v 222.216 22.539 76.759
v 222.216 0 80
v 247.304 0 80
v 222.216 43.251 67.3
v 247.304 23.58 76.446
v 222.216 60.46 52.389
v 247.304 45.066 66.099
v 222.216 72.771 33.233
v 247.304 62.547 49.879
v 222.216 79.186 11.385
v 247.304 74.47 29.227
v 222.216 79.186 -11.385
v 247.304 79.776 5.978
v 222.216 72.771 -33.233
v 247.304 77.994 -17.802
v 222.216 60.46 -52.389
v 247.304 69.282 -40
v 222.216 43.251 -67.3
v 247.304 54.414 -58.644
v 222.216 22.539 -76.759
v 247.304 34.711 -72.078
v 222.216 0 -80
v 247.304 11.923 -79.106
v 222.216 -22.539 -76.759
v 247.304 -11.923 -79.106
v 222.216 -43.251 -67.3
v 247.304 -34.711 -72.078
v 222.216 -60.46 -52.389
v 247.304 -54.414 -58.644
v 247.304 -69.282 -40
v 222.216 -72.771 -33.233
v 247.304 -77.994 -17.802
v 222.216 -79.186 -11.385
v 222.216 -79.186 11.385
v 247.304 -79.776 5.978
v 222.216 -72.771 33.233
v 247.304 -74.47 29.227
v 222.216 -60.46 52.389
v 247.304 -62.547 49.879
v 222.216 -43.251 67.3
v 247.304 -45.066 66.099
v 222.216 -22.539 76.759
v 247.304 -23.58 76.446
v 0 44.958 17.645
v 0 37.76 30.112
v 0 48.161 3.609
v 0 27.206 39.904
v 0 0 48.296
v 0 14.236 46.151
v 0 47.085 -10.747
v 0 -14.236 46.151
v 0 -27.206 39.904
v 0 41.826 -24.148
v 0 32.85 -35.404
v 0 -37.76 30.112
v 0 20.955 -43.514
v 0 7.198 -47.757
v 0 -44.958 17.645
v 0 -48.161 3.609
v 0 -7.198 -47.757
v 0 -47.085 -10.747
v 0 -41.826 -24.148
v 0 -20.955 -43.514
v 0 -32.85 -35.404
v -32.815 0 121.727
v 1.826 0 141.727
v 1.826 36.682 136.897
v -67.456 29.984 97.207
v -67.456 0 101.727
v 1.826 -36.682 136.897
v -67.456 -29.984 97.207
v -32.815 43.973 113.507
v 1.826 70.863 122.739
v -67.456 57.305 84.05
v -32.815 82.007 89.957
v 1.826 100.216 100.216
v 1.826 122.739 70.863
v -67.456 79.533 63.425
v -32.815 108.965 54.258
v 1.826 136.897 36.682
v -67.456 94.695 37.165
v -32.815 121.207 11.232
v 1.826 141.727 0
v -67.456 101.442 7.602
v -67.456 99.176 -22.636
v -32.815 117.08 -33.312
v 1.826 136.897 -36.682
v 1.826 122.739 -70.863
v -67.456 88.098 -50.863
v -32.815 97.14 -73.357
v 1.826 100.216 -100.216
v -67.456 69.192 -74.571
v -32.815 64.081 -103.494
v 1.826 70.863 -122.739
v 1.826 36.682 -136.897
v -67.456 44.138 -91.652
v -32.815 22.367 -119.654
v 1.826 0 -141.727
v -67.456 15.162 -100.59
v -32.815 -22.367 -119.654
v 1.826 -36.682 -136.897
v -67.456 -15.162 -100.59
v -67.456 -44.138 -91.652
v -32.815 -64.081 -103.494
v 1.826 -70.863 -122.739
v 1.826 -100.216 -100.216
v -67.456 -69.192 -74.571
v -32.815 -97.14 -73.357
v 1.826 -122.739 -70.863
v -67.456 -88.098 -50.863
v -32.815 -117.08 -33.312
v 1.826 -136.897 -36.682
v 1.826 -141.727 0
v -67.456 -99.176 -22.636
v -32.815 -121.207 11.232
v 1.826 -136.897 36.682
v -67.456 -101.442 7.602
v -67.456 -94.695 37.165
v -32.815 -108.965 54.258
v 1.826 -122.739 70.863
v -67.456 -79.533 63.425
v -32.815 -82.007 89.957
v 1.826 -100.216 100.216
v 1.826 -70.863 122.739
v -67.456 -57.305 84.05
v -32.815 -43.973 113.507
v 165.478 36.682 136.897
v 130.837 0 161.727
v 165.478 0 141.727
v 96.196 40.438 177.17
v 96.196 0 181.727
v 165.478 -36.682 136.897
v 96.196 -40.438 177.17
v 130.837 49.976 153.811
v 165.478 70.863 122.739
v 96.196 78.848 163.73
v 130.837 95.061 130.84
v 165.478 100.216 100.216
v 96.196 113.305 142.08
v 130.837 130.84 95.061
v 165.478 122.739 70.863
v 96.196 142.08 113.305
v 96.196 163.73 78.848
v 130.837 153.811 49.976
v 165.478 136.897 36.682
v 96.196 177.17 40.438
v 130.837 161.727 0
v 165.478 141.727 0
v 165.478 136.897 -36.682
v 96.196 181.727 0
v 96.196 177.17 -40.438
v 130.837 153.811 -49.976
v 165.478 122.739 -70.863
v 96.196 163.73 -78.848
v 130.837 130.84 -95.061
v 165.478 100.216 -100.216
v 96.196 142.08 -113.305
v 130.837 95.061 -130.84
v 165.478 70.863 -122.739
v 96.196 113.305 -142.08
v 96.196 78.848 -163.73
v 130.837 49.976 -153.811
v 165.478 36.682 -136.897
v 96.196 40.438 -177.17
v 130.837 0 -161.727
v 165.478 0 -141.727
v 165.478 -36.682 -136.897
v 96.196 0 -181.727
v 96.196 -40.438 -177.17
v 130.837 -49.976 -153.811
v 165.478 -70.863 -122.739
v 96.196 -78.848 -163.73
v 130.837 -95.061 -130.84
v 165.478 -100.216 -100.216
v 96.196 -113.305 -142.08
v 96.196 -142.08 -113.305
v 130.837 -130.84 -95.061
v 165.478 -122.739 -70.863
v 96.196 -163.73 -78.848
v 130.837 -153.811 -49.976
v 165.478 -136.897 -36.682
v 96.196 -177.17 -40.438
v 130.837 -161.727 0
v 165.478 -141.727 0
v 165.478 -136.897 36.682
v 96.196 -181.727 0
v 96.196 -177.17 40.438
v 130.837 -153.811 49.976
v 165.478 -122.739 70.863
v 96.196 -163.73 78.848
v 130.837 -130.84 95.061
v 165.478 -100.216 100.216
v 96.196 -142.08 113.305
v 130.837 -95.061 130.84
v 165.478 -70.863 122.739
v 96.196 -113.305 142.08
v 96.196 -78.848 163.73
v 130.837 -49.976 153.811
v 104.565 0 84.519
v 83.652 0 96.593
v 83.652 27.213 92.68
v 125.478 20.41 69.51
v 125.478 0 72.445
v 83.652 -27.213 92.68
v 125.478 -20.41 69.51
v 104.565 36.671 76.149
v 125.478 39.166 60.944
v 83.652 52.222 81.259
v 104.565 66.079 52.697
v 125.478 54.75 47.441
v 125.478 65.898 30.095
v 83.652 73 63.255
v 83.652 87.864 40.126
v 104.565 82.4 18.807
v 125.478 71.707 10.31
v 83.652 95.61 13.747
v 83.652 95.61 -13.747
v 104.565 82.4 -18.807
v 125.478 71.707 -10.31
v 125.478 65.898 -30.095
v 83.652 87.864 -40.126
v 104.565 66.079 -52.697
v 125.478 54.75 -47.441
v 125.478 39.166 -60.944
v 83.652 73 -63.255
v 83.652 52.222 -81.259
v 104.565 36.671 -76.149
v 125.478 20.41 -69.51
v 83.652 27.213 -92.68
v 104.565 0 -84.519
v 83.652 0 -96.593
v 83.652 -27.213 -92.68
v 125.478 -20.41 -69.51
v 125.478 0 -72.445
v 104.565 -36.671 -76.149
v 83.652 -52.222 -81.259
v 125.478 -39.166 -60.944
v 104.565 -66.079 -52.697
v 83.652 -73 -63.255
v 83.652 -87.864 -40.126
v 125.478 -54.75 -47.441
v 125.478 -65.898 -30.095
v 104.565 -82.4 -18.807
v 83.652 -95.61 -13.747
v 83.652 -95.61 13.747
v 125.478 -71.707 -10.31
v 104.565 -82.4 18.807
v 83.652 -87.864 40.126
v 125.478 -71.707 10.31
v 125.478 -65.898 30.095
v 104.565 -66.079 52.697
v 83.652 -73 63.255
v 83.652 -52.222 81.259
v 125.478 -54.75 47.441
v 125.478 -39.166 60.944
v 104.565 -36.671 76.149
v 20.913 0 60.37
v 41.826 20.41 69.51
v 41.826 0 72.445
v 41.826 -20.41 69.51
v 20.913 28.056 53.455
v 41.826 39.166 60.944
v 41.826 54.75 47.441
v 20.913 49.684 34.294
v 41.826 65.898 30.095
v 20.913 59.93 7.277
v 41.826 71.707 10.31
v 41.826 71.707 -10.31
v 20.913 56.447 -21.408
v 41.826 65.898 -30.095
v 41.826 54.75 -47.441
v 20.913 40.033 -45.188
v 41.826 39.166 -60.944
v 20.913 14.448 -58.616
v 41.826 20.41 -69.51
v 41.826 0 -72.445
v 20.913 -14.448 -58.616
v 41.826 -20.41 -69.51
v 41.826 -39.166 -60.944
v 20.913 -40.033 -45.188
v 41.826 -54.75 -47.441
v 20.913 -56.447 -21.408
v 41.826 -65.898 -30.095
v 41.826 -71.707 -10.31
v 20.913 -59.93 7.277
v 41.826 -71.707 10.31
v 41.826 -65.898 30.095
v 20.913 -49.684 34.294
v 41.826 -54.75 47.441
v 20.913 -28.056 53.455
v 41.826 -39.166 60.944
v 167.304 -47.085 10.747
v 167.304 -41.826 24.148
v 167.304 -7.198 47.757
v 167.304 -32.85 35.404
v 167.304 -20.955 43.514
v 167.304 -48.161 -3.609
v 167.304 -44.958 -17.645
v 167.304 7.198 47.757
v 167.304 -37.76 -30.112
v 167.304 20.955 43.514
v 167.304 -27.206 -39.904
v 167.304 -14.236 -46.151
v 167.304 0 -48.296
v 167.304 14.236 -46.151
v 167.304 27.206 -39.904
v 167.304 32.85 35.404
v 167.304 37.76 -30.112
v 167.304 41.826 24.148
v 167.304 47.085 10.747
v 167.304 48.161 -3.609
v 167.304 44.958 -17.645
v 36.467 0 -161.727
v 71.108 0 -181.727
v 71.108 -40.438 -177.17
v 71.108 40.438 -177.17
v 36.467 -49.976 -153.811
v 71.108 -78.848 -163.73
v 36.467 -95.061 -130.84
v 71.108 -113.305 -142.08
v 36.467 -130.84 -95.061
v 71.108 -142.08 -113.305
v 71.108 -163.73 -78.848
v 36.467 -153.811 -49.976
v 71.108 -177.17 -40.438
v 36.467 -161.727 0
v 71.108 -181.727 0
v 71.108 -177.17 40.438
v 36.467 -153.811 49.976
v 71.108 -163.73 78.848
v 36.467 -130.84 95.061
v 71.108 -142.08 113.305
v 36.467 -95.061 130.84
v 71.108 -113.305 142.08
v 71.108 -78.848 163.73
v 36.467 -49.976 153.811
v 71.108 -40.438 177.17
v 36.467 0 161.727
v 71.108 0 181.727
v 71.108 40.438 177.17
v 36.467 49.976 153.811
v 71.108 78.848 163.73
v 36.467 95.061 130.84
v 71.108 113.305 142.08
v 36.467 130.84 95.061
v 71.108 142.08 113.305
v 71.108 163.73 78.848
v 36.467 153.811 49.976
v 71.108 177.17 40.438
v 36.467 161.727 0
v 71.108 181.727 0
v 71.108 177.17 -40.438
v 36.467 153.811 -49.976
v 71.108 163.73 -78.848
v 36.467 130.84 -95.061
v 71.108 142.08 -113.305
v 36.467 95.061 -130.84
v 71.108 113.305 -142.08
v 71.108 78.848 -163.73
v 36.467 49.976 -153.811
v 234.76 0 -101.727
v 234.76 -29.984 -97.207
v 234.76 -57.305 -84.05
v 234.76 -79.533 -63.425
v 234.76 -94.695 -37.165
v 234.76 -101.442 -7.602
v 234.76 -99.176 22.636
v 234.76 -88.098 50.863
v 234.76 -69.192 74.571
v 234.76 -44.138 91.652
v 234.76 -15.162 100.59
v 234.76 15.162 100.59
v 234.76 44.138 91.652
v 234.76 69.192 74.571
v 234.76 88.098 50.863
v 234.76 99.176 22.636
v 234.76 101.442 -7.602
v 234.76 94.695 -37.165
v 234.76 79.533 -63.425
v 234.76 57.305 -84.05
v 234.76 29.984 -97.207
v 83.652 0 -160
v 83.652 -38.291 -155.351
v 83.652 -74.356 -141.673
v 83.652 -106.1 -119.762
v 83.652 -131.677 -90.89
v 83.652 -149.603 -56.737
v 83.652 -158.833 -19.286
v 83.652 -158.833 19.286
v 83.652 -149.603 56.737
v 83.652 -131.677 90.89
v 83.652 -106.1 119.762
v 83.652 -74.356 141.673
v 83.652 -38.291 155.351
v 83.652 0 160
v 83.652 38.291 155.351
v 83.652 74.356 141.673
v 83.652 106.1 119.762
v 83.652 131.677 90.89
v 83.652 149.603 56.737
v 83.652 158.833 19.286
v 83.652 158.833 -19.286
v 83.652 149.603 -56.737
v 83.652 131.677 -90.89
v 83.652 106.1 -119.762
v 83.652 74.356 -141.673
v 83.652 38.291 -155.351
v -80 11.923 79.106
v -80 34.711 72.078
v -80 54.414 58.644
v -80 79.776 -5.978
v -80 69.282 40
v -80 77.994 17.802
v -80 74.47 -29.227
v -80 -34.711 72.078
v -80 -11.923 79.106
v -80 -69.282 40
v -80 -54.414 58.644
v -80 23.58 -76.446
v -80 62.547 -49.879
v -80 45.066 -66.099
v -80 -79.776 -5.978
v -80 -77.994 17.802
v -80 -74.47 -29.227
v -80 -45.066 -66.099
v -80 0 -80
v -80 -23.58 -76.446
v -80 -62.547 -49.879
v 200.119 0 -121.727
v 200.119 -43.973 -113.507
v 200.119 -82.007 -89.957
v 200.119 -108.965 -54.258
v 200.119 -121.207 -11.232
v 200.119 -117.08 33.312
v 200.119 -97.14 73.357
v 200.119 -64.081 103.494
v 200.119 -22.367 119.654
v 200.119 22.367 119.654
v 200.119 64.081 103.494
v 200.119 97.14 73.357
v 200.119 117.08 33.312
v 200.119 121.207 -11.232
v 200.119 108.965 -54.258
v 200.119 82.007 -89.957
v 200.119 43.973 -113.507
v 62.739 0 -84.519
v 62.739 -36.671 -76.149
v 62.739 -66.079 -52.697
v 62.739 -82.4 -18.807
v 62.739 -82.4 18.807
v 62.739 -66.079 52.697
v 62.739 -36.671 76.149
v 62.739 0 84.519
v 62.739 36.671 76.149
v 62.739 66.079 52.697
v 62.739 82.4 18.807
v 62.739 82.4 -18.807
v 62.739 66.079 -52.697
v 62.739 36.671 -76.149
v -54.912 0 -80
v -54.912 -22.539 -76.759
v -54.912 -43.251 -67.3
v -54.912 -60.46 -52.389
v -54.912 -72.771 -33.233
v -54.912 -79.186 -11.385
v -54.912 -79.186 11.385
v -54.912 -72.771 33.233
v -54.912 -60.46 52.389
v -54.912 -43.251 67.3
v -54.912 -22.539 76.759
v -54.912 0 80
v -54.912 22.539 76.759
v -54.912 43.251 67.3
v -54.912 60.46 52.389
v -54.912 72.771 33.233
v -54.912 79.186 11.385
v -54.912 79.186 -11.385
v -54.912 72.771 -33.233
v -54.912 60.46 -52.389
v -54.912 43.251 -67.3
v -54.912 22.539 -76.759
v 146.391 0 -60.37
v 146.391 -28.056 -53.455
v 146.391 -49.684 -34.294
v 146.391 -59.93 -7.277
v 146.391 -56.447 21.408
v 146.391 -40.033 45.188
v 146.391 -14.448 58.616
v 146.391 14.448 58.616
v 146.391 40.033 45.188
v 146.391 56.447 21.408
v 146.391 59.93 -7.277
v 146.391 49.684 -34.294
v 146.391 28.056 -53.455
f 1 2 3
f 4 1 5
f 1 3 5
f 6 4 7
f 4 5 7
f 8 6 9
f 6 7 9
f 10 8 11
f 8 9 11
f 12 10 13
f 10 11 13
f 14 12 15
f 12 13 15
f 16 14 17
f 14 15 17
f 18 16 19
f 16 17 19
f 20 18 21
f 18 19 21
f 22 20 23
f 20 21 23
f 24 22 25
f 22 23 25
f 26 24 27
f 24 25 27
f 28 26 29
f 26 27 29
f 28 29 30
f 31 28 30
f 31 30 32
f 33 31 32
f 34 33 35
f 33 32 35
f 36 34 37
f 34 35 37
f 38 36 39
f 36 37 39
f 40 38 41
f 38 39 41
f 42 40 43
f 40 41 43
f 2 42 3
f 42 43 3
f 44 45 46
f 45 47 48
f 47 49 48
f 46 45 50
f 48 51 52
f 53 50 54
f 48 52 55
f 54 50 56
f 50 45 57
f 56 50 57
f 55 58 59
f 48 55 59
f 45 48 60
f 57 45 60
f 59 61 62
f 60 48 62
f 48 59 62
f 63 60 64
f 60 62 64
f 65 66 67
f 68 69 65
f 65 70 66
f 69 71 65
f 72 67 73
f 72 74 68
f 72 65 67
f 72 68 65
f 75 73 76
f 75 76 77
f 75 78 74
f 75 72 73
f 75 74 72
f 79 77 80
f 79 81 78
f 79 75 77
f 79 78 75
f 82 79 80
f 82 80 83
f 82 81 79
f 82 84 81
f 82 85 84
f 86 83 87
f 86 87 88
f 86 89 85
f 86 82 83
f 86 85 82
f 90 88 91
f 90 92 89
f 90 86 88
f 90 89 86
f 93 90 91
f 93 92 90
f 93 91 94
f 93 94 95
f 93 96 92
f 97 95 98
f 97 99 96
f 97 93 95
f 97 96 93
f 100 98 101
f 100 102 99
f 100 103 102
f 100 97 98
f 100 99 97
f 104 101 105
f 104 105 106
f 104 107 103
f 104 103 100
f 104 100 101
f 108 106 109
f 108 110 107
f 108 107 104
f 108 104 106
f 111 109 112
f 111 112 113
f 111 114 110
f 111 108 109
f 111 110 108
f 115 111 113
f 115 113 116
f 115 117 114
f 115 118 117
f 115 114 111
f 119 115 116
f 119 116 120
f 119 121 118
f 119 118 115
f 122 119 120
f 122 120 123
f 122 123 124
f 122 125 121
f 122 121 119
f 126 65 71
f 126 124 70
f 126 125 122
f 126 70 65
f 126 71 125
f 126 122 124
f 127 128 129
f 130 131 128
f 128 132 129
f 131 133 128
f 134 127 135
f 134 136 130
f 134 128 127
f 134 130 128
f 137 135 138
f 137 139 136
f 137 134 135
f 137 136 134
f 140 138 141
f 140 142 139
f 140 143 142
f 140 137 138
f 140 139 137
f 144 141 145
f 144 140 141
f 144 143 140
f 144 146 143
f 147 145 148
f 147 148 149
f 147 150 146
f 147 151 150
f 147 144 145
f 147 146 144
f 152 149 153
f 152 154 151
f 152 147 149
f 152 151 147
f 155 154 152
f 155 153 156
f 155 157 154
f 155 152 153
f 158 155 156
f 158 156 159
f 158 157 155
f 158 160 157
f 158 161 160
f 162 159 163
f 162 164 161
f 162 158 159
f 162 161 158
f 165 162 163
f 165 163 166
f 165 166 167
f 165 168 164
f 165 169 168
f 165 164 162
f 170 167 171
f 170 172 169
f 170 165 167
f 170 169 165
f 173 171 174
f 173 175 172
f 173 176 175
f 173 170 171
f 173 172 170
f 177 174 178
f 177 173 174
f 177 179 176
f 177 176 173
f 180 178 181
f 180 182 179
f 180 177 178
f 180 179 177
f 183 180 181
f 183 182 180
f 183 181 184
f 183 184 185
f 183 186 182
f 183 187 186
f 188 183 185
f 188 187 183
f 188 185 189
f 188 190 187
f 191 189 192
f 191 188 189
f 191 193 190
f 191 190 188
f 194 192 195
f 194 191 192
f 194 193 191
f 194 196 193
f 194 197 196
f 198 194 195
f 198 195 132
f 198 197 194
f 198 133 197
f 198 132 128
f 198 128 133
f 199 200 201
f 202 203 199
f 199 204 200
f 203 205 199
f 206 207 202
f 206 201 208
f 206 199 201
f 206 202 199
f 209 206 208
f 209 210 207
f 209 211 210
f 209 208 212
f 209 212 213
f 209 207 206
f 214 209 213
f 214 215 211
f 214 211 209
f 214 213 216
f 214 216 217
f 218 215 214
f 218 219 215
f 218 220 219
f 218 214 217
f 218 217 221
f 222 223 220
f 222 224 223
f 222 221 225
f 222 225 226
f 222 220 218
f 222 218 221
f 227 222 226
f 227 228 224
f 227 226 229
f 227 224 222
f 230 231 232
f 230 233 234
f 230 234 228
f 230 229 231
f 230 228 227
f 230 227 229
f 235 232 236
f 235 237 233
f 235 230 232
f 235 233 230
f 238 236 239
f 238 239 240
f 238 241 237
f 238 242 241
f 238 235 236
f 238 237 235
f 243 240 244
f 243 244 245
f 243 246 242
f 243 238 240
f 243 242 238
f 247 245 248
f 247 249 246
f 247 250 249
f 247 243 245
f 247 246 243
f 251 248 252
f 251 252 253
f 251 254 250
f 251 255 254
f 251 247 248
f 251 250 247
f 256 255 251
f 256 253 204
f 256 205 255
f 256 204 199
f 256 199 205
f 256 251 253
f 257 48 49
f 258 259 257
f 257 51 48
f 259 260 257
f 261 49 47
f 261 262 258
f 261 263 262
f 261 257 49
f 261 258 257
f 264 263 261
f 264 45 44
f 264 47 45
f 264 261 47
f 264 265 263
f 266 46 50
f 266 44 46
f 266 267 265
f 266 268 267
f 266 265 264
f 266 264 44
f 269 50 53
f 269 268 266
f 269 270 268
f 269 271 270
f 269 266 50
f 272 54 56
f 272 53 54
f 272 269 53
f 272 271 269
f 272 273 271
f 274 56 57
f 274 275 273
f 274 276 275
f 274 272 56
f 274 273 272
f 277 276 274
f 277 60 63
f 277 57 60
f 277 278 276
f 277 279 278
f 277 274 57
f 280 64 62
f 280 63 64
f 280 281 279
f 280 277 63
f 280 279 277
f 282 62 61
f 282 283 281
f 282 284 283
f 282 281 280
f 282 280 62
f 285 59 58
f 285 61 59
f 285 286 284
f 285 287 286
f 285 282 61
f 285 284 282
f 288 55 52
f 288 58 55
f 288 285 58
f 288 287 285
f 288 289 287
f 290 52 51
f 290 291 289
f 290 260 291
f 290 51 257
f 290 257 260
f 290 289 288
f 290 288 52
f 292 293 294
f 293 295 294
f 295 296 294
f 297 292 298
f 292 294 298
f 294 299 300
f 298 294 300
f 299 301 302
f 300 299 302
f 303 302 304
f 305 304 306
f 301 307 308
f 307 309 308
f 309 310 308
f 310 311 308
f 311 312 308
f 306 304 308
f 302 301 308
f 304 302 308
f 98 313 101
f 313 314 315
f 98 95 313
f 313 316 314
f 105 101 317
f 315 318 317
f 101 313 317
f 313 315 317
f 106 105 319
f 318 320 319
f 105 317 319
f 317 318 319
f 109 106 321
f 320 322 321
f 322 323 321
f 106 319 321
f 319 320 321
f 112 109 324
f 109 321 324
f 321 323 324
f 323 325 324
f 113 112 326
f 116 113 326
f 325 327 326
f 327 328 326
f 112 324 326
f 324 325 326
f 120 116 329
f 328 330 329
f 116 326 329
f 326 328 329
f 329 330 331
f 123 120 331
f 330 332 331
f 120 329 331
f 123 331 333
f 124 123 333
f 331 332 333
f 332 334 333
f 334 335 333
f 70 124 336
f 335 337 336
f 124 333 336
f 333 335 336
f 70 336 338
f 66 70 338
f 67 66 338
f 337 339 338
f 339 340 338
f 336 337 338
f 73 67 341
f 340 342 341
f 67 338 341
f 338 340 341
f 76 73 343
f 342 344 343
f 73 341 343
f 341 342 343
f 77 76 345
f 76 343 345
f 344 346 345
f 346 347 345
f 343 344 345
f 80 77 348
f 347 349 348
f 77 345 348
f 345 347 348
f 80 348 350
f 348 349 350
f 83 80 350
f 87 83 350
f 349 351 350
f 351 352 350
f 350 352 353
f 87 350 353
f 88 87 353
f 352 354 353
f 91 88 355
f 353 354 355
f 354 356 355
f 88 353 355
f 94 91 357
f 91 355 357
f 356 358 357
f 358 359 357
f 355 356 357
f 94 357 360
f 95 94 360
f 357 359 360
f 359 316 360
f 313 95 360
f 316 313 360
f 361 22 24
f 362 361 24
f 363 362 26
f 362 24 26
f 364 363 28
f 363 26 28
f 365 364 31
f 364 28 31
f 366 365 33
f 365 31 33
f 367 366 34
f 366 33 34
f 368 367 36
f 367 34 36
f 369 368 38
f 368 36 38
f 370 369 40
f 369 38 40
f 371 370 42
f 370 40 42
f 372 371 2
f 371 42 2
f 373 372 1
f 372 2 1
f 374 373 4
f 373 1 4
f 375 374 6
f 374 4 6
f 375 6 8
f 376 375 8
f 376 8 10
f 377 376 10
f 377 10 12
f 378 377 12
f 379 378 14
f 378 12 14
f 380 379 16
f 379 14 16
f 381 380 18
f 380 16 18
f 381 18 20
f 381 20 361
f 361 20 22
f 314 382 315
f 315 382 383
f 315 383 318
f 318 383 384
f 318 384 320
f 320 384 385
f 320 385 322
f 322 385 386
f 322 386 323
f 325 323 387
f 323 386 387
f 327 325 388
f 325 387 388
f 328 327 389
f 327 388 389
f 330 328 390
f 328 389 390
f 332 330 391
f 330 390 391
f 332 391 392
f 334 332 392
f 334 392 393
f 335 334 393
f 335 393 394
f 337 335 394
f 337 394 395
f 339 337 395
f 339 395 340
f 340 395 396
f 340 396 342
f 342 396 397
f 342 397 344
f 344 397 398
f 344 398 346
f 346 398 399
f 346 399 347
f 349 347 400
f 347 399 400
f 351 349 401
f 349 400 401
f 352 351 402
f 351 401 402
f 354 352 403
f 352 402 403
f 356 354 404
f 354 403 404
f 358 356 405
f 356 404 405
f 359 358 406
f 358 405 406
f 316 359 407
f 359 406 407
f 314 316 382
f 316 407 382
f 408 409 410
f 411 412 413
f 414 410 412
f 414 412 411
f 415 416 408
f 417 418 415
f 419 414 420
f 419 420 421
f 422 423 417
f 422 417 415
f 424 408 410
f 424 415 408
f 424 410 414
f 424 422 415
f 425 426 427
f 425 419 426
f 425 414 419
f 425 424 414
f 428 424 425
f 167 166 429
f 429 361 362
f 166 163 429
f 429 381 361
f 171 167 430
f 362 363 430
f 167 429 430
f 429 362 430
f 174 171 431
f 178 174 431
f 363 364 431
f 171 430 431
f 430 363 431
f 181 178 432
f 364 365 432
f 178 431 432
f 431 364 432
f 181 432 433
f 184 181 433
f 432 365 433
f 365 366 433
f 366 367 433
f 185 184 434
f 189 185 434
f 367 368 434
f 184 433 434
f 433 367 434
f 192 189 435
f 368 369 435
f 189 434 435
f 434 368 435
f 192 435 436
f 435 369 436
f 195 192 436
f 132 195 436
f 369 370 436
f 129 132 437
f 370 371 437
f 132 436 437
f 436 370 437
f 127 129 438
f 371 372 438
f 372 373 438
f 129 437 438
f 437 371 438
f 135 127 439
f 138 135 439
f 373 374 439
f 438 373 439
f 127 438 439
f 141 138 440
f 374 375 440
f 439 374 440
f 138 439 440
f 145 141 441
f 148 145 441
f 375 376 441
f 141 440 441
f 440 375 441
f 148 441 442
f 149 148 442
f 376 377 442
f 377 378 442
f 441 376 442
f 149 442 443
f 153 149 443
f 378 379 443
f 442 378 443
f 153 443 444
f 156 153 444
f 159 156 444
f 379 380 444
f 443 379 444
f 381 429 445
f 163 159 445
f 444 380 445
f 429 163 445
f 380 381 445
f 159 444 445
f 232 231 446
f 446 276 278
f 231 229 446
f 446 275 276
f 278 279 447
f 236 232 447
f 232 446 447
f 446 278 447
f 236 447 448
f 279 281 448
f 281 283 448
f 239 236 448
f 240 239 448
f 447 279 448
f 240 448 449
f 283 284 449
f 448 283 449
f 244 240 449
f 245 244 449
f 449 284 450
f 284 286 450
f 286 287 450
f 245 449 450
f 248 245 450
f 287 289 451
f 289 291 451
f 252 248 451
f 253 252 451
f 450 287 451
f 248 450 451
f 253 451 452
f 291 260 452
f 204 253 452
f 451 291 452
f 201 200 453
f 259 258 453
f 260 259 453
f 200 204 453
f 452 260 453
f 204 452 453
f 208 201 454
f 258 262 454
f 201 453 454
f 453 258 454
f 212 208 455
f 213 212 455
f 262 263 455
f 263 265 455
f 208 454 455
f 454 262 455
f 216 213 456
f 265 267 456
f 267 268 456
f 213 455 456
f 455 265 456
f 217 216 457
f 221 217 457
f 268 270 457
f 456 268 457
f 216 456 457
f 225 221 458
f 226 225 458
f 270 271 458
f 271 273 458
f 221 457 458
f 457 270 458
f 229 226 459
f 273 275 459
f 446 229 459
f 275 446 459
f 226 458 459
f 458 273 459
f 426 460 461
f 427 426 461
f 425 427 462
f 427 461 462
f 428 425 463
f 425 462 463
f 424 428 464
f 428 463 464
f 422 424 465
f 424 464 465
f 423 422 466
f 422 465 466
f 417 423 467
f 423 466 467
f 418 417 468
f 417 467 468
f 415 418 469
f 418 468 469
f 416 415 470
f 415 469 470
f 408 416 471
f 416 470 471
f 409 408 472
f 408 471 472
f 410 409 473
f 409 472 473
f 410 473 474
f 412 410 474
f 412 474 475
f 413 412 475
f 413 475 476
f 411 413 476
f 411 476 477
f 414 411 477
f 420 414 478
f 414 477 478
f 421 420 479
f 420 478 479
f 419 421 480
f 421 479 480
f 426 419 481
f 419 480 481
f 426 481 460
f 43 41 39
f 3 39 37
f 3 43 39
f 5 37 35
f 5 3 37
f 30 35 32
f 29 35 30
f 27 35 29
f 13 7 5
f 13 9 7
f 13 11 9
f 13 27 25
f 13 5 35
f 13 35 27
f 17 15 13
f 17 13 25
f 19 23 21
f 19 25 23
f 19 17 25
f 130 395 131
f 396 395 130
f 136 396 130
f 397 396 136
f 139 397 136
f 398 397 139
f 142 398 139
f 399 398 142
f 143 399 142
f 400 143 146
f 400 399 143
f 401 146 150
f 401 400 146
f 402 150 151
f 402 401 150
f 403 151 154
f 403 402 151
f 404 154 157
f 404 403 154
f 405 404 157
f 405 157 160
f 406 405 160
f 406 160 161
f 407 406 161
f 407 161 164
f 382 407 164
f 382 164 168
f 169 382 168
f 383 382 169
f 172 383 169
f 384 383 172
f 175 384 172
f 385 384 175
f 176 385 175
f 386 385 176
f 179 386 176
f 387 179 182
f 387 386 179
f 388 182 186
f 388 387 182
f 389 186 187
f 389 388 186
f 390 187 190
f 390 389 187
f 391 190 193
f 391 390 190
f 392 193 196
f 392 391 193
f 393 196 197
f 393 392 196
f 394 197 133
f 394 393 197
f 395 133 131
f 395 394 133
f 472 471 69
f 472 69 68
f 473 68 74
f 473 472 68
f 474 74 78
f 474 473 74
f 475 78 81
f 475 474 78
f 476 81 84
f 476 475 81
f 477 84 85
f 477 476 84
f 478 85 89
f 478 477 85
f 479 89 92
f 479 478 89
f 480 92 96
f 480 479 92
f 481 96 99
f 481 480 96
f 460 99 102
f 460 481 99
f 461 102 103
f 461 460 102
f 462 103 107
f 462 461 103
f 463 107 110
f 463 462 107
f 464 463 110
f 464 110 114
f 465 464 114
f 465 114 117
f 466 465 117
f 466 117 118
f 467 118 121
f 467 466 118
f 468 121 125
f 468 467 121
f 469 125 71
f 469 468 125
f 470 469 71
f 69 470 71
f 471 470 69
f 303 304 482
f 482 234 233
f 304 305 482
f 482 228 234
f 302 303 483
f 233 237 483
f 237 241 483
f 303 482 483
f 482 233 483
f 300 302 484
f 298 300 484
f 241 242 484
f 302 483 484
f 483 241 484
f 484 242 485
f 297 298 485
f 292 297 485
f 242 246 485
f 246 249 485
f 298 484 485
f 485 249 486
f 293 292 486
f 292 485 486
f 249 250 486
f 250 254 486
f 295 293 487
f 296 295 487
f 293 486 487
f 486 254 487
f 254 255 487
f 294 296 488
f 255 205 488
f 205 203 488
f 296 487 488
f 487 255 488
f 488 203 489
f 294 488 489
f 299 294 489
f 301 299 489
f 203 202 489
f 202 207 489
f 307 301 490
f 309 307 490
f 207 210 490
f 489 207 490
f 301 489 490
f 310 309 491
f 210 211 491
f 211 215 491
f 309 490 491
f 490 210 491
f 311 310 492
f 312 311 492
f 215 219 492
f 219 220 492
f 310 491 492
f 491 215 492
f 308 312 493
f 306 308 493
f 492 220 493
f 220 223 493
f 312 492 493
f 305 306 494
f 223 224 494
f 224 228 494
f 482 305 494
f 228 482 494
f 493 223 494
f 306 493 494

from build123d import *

# Parameters (mm, degrees)
F0_W = 80
F0_H = 80


# Not quite as in the source:
# - after a boolean that leaves OpenCascade's solid faulty, fix() repairs it


with BuildPart() as f1:
    # F0 (on Front) → F1 (revolve)
    with BuildSketch(Plane.XZ):
        with Locations((207.3035305738, 40)):
            Rectangle(F0_W, F0_H)
        Polygon((194.7596802331, -32.4445538099), (125.4776479304, -72.4445538099), (165.4776479304, -141.7265861126), (234.7596802331, -101.7265861126), align=None)
        with Locations((-40, -40)):
            Rectangle(F0_W, F0_H)
        Polygon((111.1079149462, -112.4445538099), (41.8258826435, -72.4445538099), (1.8258826435, -141.7265861126), (71.1079149462, -181.7265861126), align=None)
        Polygon((125.4776479304, 72.4445538099), (165.4776479304, 141.7265861126), (96.1956156276, 181.7265861126), (56.1956156276, 112.4445538099), align=None)
        Polygon((41.8258826435, 72.4445538099), (1.8258826435, 141.7265861126), (-67.4561496593, 101.7265861126), (-27.4561496593, 32.4445538099), align=None)
    revolve(axis=Axis((207.3035305738, 0, 0), (-1, 0, 0)))

    add(f1.part.fix(), mode=Mode.REPLACE)


solid = f1.part
